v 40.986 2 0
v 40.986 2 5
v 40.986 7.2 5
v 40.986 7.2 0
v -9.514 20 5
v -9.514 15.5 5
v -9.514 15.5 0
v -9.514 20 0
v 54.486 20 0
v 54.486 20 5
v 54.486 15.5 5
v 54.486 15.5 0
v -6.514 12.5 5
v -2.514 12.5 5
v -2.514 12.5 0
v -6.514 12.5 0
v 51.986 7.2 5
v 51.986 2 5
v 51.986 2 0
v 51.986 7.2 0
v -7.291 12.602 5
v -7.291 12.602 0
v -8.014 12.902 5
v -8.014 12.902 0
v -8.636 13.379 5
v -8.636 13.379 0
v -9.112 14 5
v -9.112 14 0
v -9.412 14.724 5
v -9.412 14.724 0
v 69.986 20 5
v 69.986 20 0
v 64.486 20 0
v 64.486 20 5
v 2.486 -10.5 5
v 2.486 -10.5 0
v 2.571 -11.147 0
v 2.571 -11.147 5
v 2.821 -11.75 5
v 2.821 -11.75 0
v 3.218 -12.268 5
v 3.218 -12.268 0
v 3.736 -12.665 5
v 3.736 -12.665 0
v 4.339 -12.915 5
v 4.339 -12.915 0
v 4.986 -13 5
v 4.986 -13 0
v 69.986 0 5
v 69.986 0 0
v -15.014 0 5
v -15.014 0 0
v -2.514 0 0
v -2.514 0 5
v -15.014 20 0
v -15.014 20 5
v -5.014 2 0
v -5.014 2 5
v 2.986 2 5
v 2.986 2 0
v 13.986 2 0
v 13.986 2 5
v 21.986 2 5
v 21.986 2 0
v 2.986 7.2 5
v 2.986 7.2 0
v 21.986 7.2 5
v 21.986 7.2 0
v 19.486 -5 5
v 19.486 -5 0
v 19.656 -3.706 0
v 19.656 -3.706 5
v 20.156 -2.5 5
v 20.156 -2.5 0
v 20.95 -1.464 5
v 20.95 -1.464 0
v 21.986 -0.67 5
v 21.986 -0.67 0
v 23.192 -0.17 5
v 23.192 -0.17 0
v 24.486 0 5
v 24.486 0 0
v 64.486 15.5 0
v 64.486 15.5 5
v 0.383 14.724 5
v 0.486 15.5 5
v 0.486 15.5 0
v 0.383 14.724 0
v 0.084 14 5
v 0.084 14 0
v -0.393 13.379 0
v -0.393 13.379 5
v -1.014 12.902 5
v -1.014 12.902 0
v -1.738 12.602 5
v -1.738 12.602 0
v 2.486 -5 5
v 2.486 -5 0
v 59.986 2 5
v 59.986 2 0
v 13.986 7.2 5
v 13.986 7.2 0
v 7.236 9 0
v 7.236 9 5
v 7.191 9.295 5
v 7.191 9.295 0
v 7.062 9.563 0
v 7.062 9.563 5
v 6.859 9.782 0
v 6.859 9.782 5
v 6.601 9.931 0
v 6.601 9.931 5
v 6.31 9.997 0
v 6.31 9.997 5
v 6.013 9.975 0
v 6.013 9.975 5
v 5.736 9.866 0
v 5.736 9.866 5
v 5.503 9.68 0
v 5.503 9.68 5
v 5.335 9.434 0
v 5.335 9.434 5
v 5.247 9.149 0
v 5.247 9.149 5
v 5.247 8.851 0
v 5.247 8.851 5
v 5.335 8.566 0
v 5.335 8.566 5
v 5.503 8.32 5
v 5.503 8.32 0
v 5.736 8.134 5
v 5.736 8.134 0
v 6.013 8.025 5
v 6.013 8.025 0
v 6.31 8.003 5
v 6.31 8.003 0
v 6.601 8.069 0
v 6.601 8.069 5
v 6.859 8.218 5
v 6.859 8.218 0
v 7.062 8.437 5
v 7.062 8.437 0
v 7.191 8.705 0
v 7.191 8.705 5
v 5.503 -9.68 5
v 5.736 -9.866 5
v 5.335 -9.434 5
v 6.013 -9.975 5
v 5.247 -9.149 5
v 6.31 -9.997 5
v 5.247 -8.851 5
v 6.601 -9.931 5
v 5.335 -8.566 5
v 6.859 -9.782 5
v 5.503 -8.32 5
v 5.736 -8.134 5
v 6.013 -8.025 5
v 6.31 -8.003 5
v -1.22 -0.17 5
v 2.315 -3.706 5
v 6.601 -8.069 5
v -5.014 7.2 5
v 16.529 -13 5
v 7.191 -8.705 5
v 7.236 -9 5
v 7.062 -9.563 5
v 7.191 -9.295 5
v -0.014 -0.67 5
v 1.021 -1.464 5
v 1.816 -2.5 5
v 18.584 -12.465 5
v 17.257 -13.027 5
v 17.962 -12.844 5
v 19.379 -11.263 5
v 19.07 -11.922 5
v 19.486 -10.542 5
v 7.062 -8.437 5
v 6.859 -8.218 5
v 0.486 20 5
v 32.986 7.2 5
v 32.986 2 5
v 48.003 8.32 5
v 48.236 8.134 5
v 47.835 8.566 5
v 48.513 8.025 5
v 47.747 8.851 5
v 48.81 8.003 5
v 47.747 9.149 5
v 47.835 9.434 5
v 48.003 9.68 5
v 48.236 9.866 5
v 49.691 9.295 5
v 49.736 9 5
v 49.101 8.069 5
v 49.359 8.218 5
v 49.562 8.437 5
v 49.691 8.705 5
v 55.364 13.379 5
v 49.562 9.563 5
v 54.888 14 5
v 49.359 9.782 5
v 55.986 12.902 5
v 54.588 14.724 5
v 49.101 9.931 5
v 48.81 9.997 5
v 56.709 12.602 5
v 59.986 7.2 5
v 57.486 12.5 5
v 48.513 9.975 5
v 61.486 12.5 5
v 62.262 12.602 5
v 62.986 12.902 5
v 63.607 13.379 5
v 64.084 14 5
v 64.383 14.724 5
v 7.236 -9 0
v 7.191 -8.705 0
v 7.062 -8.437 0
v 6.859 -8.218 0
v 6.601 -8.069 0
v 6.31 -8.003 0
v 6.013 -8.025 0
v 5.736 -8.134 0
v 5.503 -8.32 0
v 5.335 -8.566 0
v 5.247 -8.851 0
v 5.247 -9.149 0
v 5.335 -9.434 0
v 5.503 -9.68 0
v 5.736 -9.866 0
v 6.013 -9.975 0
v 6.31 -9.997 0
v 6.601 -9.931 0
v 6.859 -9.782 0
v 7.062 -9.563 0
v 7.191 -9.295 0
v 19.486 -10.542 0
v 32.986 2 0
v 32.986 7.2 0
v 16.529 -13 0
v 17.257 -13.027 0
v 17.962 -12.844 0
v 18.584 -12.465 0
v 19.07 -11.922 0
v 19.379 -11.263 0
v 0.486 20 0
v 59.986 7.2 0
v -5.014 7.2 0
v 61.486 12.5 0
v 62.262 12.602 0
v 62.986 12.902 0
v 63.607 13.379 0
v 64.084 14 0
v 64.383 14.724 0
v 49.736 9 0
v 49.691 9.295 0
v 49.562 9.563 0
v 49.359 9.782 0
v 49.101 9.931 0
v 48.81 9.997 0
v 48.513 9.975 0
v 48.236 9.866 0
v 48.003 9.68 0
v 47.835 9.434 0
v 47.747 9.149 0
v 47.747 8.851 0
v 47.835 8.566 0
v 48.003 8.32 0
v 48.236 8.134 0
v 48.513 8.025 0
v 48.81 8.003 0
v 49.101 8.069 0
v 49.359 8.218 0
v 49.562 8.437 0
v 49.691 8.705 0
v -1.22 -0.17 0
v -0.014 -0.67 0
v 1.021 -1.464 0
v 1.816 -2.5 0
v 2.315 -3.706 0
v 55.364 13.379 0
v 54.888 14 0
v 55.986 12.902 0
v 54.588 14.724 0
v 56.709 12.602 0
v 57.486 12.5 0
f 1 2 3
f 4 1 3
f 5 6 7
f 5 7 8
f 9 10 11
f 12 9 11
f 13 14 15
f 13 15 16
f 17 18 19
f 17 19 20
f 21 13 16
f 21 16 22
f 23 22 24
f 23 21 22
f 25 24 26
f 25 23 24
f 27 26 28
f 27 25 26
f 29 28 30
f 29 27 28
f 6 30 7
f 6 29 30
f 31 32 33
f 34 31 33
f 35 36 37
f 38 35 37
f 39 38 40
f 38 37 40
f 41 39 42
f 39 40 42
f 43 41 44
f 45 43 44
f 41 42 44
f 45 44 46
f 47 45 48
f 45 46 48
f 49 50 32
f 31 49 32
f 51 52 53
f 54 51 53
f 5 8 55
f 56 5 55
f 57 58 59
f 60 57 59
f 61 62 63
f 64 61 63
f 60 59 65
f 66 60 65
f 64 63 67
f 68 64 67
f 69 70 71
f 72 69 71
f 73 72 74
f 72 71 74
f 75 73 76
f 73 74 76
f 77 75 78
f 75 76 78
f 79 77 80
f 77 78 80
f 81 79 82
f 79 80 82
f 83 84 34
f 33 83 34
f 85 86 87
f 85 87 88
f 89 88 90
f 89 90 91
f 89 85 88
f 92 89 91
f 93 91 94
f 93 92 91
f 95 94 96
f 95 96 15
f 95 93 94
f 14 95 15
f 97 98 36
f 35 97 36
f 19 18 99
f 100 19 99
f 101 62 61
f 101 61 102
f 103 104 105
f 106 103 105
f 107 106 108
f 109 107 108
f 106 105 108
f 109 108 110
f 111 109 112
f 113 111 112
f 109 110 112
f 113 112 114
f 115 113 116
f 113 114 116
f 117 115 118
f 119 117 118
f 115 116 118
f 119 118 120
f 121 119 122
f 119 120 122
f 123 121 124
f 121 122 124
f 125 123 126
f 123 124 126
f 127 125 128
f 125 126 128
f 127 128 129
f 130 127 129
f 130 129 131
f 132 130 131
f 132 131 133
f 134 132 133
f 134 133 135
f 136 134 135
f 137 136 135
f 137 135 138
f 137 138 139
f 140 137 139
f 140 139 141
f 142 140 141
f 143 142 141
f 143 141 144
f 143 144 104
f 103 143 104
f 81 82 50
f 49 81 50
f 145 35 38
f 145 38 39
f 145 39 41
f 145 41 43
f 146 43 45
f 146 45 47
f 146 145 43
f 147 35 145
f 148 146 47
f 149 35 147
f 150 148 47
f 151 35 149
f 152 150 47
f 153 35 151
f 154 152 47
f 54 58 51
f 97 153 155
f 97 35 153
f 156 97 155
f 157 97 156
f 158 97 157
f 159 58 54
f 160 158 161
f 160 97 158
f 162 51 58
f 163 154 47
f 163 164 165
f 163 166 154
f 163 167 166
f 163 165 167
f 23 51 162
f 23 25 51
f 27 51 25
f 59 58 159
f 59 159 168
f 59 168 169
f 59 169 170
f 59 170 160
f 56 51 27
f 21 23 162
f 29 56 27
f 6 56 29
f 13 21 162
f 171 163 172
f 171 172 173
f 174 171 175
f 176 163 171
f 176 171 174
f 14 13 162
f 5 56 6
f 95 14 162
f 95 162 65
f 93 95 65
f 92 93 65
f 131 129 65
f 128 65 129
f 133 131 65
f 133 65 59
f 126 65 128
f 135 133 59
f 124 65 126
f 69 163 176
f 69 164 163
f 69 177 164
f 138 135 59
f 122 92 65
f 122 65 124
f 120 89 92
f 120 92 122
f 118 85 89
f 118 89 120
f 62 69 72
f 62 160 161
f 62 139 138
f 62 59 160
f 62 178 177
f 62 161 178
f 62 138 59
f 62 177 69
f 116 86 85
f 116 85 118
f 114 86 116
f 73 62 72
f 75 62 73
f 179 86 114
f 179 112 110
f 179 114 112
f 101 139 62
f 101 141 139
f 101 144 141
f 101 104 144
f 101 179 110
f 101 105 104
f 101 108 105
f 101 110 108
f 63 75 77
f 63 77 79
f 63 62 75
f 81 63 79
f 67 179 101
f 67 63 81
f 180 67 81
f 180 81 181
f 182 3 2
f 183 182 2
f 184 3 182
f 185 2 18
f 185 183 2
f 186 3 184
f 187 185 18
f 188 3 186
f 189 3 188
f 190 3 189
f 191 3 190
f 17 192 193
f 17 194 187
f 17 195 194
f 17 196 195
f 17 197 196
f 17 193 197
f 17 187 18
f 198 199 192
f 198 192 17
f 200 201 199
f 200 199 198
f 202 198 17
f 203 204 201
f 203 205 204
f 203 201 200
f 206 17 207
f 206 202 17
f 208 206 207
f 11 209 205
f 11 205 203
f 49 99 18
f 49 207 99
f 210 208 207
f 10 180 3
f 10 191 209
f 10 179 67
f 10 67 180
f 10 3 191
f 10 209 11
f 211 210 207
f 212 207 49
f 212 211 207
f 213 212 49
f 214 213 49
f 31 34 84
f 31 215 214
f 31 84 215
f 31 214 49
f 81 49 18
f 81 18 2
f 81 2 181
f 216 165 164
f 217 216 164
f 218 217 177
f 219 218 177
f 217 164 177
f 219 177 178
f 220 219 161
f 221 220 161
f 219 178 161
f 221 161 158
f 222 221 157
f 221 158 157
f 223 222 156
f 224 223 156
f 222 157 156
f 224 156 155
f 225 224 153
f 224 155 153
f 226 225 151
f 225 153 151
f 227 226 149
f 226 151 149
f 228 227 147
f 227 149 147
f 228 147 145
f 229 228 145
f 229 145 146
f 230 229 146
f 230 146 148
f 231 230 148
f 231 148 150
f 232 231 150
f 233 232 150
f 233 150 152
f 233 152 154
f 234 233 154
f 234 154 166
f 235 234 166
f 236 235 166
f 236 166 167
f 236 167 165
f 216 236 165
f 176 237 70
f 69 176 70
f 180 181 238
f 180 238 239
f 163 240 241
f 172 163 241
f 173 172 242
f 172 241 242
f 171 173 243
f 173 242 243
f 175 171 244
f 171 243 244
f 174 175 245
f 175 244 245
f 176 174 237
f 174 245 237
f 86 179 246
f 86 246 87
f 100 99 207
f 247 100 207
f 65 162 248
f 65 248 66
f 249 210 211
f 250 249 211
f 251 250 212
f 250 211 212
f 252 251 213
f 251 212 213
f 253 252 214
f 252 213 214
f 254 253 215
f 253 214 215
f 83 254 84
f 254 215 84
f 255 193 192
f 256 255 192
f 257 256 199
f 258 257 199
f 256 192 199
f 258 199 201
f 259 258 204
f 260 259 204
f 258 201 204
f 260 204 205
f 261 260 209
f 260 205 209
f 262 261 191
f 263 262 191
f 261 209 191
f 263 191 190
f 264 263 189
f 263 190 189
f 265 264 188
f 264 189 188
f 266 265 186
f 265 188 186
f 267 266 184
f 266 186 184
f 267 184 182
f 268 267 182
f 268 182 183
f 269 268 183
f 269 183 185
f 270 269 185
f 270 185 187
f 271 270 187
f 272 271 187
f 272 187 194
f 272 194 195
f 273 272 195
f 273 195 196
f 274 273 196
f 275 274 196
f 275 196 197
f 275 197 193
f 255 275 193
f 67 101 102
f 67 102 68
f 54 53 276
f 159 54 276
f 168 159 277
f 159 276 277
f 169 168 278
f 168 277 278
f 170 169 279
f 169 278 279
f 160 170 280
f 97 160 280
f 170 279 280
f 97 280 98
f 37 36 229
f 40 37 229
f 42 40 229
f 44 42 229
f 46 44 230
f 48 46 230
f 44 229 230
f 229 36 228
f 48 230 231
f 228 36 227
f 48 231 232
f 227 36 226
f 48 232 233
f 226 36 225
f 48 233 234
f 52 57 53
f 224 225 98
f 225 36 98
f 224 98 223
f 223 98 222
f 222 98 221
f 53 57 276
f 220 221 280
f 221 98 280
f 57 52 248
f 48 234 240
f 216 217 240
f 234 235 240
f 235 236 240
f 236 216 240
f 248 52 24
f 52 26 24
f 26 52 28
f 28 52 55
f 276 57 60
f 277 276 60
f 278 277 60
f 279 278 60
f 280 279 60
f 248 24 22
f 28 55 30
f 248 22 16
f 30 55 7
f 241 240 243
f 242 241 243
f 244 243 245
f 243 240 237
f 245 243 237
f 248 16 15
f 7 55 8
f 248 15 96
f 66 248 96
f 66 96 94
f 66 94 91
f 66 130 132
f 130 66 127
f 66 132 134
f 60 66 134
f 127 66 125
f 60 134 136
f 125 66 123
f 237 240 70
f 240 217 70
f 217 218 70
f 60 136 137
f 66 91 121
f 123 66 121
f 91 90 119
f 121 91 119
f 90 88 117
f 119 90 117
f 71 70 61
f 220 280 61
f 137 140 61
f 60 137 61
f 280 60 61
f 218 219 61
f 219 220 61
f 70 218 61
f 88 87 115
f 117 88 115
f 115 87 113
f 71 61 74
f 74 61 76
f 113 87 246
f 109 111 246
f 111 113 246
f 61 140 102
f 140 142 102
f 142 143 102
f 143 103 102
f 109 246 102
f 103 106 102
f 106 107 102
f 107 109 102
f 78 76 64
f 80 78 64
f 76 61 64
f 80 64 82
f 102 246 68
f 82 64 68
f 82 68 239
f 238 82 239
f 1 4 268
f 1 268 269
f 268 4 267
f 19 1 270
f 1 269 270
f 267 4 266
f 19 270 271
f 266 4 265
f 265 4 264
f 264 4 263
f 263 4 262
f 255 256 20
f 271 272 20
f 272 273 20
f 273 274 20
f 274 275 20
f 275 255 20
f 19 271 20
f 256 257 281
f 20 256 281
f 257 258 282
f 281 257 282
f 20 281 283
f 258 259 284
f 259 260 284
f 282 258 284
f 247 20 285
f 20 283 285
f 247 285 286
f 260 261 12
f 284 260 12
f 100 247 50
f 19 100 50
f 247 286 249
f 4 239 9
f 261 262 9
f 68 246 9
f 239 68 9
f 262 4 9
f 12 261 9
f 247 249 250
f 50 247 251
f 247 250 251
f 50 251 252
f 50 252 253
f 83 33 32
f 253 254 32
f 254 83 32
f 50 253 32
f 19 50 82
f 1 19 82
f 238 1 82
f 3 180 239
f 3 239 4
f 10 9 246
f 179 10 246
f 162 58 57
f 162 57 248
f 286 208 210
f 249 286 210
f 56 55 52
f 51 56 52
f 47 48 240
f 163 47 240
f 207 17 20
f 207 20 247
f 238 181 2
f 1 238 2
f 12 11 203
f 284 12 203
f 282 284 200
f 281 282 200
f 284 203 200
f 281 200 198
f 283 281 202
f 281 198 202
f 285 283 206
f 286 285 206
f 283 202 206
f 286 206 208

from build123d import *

# Parameters (mm, degrees)
BOSS_EXTRUDE1_DEPTH = 5
CUT_EXTRUDE1_REACH  = 7
SKETCH2_W           = 8
SKETCH2_H           = 5.2
CUT_EXTRUDE2_DEPTH  = 5
CUT_EXTRUDE3_REACH  = 7
SKETCH5_R           = 1


with BuildPart() as part:
    # Sketch1 → Boss-Extrude1 (new body)
    with BuildSketch(Plane.XY):
        with BuildLine():
            Line((24.485627442, 0), (69.985627442, 0))
            Line((69.985627442, 0), (69.985627442, 20))
            Line((69.985627442, 20), (-15.014372558, 20))
            Line((-15.014372558, 20), (-15.014372558, 0))
            Line((-15.014372558, 0), (-2.514372558, 0))
            ThreePointArc((-2.514372558, 0), (1.021161348, -1.464466094), (2.485627442, -5))
            Line((2.485627442, -5), (2.485627442, -10.5))
            ThreePointArc((2.485627442, -10.5), (3.217860489, -12.267766953), (4.985627442, -13))
            Line((4.985627442, -13), (16.528766582, -13))
            ThreePointArc((16.528766582, -13), (18.58372754, -12.464616991), (19.485627442, -10.542098831))
            Line((19.485627442, -10.542098831), (19.485627442, -5))
            ThreePointArc((19.485627442, -5), (20.950093536, -1.464466094), (24.485627442, 0))
        make_face()
    extrude(amount=BOSS_EXTRUDE1_DEPTH)

    # Sketch2 → Cut-Extrude1 (cut, up to next)
    with BuildSketch(Plane.XY.offset(5), mode=Mode.PRIVATE) as cut_extrude1_sk1:
        with Locations((-1.014372558, 4.6)):
            Rectangle(SKETCH2_W, SKETCH2_H)
    cut_extrude1_tool1 = extrude(cut_extrude1_sk1.sketch, amount=-CUT_EXTRUDE1_REACH, mode=Mode.PRIVATE) & part.part
    add(cut_extrude1_tool1.solids().sort_by_distance((-1.014373, 4.6, 5))[0], mode=Mode.SUBTRACT)
    # Sketch2 → Cut-Extrude1 (cut, up to next)
    with BuildSketch(Plane.XY.offset(5), mode=Mode.PRIVATE) as cut_extrude1_sk2:
        with Locations((17.985627442, 4.6)):
            Rectangle(SKETCH2_W, SKETCH2_H)
    cut_extrude1_tool2 = extrude(cut_extrude1_sk2.sketch, amount=-CUT_EXTRUDE1_REACH, mode=Mode.PRIVATE) & part.part
    add(cut_extrude1_tool2.solids().sort_by_distance((17.985627, 4.6, 5))[0], mode=Mode.SUBTRACT)
    # Sketch2 → Cut-Extrude1 (cut, up to next)
    with BuildSketch(Plane.XY.offset(5), mode=Mode.PRIVATE) as cut_extrude1_sk3:
        with Locations((36.985627442, 4.6)):
            Rectangle(SKETCH2_W, SKETCH2_H)
    cut_extrude1_tool3 = extrude(cut_extrude1_sk3.sketch, amount=-CUT_EXTRUDE1_REACH, mode=Mode.PRIVATE) & part.part
    add(cut_extrude1_tool3.solids().sort_by_distance((36.985627, 4.6, 5))[0], mode=Mode.SUBTRACT)
    # Sketch2 → Cut-Extrude1 (cut, up to next)
    with BuildSketch(Plane.XY.offset(5), mode=Mode.PRIVATE) as cut_extrude1_sk4:
        with Locations((55.985627442, 4.6)):
            Rectangle(SKETCH2_W, SKETCH2_H)
    cut_extrude1_tool4 = extrude(cut_extrude1_sk4.sketch, amount=-CUT_EXTRUDE1_REACH, mode=Mode.PRIVATE) & part.part
    add(cut_extrude1_tool4.solids().sort_by_distance((55.985627, 4.6, 5))[0], mode=Mode.SUBTRACT)

    # Sketch3 → Cut-Extrude2 (cut)
    with BuildSketch(Plane.XY.offset(5)):
        with BuildLine():
            Line((-9.514372558, 20), (0.485627442, 20))
            Line((0.485627442, 20), (0.485627442, 15.5))
            ThreePointArc((0.485627442, 15.5), (-0.393052215, 13.378679656), (-2.514372558, 12.5))
            Line((-2.514372558, 12.5), (-6.514372558, 12.5))
            ThreePointArc((-6.514372558, 12.5), (-8.635692902, 13.378679656), (-9.514372558, 15.5))
            Line((-9.514372558, 15.5), (-9.514372558, 20))
        make_face()
    cut_extrude2 = extrude(amount=-CUT_EXTRUDE2_DEPTH, mode=Mode.SUBTRACT)

    # Mirror1: Cut-Extrude2 across plane
    add(cut_extrude2.mirror(Plane(origin=(27.485627442, 0, 0), x_dir=(0, 0, 1), z_dir=(1, 0, 0))), mode=Mode.SUBTRACT)

    # Sketch5 → Cut-Extrude3 (cut, up to next)
    with BuildSketch(Plane.XY.offset(5), mode=Mode.PRIVATE) as cut_extrude3_sk1:
        with Locations((6.235627442, 9)):
            Circle(SKETCH5_R)
    cut_extrude3_tool1 = extrude(cut_extrude3_sk1.sketch, amount=-CUT_EXTRUDE3_REACH, mode=Mode.PRIVATE) & part.part
    add(cut_extrude3_tool1.solids().sort_by_distance((6.235627, 9, 5))[0], mode=Mode.SUBTRACT)
    # Sketch5 → Cut-Extrude3 (cut, up to next)
    with BuildSketch(Plane.XY.offset(5), mode=Mode.PRIVATE) as cut_extrude3_sk2:
        with Locations((48.735627442, 9)):
            Circle(SKETCH5_R)
    cut_extrude3_tool2 = extrude(cut_extrude3_sk2.sketch, amount=-CUT_EXTRUDE3_REACH, mode=Mode.PRIVATE) & part.part
    add(cut_extrude3_tool2.solids().sort_by_distance((48.735627, 9, 5))[0], mode=Mode.SUBTRACT)
    # Sketch5 → Cut-Extrude3 (cut, up to next)
    with BuildSketch(Plane.XY.offset(5), mode=Mode.PRIVATE) as cut_extrude3_sk3:
        with Locations((6.235627442, -9)):
            Circle(SKETCH5_R)
    cut_extrude3_tool3 = extrude(cut_extrude3_sk3.sketch, amount=-CUT_EXTRUDE3_REACH, mode=Mode.PRIVATE) & part.part
    add(cut_extrude3_tool3.solids().sort_by_distance((6.235627, -9, 5))[0], mode=Mode.SUBTRACT)


solid = part.part
